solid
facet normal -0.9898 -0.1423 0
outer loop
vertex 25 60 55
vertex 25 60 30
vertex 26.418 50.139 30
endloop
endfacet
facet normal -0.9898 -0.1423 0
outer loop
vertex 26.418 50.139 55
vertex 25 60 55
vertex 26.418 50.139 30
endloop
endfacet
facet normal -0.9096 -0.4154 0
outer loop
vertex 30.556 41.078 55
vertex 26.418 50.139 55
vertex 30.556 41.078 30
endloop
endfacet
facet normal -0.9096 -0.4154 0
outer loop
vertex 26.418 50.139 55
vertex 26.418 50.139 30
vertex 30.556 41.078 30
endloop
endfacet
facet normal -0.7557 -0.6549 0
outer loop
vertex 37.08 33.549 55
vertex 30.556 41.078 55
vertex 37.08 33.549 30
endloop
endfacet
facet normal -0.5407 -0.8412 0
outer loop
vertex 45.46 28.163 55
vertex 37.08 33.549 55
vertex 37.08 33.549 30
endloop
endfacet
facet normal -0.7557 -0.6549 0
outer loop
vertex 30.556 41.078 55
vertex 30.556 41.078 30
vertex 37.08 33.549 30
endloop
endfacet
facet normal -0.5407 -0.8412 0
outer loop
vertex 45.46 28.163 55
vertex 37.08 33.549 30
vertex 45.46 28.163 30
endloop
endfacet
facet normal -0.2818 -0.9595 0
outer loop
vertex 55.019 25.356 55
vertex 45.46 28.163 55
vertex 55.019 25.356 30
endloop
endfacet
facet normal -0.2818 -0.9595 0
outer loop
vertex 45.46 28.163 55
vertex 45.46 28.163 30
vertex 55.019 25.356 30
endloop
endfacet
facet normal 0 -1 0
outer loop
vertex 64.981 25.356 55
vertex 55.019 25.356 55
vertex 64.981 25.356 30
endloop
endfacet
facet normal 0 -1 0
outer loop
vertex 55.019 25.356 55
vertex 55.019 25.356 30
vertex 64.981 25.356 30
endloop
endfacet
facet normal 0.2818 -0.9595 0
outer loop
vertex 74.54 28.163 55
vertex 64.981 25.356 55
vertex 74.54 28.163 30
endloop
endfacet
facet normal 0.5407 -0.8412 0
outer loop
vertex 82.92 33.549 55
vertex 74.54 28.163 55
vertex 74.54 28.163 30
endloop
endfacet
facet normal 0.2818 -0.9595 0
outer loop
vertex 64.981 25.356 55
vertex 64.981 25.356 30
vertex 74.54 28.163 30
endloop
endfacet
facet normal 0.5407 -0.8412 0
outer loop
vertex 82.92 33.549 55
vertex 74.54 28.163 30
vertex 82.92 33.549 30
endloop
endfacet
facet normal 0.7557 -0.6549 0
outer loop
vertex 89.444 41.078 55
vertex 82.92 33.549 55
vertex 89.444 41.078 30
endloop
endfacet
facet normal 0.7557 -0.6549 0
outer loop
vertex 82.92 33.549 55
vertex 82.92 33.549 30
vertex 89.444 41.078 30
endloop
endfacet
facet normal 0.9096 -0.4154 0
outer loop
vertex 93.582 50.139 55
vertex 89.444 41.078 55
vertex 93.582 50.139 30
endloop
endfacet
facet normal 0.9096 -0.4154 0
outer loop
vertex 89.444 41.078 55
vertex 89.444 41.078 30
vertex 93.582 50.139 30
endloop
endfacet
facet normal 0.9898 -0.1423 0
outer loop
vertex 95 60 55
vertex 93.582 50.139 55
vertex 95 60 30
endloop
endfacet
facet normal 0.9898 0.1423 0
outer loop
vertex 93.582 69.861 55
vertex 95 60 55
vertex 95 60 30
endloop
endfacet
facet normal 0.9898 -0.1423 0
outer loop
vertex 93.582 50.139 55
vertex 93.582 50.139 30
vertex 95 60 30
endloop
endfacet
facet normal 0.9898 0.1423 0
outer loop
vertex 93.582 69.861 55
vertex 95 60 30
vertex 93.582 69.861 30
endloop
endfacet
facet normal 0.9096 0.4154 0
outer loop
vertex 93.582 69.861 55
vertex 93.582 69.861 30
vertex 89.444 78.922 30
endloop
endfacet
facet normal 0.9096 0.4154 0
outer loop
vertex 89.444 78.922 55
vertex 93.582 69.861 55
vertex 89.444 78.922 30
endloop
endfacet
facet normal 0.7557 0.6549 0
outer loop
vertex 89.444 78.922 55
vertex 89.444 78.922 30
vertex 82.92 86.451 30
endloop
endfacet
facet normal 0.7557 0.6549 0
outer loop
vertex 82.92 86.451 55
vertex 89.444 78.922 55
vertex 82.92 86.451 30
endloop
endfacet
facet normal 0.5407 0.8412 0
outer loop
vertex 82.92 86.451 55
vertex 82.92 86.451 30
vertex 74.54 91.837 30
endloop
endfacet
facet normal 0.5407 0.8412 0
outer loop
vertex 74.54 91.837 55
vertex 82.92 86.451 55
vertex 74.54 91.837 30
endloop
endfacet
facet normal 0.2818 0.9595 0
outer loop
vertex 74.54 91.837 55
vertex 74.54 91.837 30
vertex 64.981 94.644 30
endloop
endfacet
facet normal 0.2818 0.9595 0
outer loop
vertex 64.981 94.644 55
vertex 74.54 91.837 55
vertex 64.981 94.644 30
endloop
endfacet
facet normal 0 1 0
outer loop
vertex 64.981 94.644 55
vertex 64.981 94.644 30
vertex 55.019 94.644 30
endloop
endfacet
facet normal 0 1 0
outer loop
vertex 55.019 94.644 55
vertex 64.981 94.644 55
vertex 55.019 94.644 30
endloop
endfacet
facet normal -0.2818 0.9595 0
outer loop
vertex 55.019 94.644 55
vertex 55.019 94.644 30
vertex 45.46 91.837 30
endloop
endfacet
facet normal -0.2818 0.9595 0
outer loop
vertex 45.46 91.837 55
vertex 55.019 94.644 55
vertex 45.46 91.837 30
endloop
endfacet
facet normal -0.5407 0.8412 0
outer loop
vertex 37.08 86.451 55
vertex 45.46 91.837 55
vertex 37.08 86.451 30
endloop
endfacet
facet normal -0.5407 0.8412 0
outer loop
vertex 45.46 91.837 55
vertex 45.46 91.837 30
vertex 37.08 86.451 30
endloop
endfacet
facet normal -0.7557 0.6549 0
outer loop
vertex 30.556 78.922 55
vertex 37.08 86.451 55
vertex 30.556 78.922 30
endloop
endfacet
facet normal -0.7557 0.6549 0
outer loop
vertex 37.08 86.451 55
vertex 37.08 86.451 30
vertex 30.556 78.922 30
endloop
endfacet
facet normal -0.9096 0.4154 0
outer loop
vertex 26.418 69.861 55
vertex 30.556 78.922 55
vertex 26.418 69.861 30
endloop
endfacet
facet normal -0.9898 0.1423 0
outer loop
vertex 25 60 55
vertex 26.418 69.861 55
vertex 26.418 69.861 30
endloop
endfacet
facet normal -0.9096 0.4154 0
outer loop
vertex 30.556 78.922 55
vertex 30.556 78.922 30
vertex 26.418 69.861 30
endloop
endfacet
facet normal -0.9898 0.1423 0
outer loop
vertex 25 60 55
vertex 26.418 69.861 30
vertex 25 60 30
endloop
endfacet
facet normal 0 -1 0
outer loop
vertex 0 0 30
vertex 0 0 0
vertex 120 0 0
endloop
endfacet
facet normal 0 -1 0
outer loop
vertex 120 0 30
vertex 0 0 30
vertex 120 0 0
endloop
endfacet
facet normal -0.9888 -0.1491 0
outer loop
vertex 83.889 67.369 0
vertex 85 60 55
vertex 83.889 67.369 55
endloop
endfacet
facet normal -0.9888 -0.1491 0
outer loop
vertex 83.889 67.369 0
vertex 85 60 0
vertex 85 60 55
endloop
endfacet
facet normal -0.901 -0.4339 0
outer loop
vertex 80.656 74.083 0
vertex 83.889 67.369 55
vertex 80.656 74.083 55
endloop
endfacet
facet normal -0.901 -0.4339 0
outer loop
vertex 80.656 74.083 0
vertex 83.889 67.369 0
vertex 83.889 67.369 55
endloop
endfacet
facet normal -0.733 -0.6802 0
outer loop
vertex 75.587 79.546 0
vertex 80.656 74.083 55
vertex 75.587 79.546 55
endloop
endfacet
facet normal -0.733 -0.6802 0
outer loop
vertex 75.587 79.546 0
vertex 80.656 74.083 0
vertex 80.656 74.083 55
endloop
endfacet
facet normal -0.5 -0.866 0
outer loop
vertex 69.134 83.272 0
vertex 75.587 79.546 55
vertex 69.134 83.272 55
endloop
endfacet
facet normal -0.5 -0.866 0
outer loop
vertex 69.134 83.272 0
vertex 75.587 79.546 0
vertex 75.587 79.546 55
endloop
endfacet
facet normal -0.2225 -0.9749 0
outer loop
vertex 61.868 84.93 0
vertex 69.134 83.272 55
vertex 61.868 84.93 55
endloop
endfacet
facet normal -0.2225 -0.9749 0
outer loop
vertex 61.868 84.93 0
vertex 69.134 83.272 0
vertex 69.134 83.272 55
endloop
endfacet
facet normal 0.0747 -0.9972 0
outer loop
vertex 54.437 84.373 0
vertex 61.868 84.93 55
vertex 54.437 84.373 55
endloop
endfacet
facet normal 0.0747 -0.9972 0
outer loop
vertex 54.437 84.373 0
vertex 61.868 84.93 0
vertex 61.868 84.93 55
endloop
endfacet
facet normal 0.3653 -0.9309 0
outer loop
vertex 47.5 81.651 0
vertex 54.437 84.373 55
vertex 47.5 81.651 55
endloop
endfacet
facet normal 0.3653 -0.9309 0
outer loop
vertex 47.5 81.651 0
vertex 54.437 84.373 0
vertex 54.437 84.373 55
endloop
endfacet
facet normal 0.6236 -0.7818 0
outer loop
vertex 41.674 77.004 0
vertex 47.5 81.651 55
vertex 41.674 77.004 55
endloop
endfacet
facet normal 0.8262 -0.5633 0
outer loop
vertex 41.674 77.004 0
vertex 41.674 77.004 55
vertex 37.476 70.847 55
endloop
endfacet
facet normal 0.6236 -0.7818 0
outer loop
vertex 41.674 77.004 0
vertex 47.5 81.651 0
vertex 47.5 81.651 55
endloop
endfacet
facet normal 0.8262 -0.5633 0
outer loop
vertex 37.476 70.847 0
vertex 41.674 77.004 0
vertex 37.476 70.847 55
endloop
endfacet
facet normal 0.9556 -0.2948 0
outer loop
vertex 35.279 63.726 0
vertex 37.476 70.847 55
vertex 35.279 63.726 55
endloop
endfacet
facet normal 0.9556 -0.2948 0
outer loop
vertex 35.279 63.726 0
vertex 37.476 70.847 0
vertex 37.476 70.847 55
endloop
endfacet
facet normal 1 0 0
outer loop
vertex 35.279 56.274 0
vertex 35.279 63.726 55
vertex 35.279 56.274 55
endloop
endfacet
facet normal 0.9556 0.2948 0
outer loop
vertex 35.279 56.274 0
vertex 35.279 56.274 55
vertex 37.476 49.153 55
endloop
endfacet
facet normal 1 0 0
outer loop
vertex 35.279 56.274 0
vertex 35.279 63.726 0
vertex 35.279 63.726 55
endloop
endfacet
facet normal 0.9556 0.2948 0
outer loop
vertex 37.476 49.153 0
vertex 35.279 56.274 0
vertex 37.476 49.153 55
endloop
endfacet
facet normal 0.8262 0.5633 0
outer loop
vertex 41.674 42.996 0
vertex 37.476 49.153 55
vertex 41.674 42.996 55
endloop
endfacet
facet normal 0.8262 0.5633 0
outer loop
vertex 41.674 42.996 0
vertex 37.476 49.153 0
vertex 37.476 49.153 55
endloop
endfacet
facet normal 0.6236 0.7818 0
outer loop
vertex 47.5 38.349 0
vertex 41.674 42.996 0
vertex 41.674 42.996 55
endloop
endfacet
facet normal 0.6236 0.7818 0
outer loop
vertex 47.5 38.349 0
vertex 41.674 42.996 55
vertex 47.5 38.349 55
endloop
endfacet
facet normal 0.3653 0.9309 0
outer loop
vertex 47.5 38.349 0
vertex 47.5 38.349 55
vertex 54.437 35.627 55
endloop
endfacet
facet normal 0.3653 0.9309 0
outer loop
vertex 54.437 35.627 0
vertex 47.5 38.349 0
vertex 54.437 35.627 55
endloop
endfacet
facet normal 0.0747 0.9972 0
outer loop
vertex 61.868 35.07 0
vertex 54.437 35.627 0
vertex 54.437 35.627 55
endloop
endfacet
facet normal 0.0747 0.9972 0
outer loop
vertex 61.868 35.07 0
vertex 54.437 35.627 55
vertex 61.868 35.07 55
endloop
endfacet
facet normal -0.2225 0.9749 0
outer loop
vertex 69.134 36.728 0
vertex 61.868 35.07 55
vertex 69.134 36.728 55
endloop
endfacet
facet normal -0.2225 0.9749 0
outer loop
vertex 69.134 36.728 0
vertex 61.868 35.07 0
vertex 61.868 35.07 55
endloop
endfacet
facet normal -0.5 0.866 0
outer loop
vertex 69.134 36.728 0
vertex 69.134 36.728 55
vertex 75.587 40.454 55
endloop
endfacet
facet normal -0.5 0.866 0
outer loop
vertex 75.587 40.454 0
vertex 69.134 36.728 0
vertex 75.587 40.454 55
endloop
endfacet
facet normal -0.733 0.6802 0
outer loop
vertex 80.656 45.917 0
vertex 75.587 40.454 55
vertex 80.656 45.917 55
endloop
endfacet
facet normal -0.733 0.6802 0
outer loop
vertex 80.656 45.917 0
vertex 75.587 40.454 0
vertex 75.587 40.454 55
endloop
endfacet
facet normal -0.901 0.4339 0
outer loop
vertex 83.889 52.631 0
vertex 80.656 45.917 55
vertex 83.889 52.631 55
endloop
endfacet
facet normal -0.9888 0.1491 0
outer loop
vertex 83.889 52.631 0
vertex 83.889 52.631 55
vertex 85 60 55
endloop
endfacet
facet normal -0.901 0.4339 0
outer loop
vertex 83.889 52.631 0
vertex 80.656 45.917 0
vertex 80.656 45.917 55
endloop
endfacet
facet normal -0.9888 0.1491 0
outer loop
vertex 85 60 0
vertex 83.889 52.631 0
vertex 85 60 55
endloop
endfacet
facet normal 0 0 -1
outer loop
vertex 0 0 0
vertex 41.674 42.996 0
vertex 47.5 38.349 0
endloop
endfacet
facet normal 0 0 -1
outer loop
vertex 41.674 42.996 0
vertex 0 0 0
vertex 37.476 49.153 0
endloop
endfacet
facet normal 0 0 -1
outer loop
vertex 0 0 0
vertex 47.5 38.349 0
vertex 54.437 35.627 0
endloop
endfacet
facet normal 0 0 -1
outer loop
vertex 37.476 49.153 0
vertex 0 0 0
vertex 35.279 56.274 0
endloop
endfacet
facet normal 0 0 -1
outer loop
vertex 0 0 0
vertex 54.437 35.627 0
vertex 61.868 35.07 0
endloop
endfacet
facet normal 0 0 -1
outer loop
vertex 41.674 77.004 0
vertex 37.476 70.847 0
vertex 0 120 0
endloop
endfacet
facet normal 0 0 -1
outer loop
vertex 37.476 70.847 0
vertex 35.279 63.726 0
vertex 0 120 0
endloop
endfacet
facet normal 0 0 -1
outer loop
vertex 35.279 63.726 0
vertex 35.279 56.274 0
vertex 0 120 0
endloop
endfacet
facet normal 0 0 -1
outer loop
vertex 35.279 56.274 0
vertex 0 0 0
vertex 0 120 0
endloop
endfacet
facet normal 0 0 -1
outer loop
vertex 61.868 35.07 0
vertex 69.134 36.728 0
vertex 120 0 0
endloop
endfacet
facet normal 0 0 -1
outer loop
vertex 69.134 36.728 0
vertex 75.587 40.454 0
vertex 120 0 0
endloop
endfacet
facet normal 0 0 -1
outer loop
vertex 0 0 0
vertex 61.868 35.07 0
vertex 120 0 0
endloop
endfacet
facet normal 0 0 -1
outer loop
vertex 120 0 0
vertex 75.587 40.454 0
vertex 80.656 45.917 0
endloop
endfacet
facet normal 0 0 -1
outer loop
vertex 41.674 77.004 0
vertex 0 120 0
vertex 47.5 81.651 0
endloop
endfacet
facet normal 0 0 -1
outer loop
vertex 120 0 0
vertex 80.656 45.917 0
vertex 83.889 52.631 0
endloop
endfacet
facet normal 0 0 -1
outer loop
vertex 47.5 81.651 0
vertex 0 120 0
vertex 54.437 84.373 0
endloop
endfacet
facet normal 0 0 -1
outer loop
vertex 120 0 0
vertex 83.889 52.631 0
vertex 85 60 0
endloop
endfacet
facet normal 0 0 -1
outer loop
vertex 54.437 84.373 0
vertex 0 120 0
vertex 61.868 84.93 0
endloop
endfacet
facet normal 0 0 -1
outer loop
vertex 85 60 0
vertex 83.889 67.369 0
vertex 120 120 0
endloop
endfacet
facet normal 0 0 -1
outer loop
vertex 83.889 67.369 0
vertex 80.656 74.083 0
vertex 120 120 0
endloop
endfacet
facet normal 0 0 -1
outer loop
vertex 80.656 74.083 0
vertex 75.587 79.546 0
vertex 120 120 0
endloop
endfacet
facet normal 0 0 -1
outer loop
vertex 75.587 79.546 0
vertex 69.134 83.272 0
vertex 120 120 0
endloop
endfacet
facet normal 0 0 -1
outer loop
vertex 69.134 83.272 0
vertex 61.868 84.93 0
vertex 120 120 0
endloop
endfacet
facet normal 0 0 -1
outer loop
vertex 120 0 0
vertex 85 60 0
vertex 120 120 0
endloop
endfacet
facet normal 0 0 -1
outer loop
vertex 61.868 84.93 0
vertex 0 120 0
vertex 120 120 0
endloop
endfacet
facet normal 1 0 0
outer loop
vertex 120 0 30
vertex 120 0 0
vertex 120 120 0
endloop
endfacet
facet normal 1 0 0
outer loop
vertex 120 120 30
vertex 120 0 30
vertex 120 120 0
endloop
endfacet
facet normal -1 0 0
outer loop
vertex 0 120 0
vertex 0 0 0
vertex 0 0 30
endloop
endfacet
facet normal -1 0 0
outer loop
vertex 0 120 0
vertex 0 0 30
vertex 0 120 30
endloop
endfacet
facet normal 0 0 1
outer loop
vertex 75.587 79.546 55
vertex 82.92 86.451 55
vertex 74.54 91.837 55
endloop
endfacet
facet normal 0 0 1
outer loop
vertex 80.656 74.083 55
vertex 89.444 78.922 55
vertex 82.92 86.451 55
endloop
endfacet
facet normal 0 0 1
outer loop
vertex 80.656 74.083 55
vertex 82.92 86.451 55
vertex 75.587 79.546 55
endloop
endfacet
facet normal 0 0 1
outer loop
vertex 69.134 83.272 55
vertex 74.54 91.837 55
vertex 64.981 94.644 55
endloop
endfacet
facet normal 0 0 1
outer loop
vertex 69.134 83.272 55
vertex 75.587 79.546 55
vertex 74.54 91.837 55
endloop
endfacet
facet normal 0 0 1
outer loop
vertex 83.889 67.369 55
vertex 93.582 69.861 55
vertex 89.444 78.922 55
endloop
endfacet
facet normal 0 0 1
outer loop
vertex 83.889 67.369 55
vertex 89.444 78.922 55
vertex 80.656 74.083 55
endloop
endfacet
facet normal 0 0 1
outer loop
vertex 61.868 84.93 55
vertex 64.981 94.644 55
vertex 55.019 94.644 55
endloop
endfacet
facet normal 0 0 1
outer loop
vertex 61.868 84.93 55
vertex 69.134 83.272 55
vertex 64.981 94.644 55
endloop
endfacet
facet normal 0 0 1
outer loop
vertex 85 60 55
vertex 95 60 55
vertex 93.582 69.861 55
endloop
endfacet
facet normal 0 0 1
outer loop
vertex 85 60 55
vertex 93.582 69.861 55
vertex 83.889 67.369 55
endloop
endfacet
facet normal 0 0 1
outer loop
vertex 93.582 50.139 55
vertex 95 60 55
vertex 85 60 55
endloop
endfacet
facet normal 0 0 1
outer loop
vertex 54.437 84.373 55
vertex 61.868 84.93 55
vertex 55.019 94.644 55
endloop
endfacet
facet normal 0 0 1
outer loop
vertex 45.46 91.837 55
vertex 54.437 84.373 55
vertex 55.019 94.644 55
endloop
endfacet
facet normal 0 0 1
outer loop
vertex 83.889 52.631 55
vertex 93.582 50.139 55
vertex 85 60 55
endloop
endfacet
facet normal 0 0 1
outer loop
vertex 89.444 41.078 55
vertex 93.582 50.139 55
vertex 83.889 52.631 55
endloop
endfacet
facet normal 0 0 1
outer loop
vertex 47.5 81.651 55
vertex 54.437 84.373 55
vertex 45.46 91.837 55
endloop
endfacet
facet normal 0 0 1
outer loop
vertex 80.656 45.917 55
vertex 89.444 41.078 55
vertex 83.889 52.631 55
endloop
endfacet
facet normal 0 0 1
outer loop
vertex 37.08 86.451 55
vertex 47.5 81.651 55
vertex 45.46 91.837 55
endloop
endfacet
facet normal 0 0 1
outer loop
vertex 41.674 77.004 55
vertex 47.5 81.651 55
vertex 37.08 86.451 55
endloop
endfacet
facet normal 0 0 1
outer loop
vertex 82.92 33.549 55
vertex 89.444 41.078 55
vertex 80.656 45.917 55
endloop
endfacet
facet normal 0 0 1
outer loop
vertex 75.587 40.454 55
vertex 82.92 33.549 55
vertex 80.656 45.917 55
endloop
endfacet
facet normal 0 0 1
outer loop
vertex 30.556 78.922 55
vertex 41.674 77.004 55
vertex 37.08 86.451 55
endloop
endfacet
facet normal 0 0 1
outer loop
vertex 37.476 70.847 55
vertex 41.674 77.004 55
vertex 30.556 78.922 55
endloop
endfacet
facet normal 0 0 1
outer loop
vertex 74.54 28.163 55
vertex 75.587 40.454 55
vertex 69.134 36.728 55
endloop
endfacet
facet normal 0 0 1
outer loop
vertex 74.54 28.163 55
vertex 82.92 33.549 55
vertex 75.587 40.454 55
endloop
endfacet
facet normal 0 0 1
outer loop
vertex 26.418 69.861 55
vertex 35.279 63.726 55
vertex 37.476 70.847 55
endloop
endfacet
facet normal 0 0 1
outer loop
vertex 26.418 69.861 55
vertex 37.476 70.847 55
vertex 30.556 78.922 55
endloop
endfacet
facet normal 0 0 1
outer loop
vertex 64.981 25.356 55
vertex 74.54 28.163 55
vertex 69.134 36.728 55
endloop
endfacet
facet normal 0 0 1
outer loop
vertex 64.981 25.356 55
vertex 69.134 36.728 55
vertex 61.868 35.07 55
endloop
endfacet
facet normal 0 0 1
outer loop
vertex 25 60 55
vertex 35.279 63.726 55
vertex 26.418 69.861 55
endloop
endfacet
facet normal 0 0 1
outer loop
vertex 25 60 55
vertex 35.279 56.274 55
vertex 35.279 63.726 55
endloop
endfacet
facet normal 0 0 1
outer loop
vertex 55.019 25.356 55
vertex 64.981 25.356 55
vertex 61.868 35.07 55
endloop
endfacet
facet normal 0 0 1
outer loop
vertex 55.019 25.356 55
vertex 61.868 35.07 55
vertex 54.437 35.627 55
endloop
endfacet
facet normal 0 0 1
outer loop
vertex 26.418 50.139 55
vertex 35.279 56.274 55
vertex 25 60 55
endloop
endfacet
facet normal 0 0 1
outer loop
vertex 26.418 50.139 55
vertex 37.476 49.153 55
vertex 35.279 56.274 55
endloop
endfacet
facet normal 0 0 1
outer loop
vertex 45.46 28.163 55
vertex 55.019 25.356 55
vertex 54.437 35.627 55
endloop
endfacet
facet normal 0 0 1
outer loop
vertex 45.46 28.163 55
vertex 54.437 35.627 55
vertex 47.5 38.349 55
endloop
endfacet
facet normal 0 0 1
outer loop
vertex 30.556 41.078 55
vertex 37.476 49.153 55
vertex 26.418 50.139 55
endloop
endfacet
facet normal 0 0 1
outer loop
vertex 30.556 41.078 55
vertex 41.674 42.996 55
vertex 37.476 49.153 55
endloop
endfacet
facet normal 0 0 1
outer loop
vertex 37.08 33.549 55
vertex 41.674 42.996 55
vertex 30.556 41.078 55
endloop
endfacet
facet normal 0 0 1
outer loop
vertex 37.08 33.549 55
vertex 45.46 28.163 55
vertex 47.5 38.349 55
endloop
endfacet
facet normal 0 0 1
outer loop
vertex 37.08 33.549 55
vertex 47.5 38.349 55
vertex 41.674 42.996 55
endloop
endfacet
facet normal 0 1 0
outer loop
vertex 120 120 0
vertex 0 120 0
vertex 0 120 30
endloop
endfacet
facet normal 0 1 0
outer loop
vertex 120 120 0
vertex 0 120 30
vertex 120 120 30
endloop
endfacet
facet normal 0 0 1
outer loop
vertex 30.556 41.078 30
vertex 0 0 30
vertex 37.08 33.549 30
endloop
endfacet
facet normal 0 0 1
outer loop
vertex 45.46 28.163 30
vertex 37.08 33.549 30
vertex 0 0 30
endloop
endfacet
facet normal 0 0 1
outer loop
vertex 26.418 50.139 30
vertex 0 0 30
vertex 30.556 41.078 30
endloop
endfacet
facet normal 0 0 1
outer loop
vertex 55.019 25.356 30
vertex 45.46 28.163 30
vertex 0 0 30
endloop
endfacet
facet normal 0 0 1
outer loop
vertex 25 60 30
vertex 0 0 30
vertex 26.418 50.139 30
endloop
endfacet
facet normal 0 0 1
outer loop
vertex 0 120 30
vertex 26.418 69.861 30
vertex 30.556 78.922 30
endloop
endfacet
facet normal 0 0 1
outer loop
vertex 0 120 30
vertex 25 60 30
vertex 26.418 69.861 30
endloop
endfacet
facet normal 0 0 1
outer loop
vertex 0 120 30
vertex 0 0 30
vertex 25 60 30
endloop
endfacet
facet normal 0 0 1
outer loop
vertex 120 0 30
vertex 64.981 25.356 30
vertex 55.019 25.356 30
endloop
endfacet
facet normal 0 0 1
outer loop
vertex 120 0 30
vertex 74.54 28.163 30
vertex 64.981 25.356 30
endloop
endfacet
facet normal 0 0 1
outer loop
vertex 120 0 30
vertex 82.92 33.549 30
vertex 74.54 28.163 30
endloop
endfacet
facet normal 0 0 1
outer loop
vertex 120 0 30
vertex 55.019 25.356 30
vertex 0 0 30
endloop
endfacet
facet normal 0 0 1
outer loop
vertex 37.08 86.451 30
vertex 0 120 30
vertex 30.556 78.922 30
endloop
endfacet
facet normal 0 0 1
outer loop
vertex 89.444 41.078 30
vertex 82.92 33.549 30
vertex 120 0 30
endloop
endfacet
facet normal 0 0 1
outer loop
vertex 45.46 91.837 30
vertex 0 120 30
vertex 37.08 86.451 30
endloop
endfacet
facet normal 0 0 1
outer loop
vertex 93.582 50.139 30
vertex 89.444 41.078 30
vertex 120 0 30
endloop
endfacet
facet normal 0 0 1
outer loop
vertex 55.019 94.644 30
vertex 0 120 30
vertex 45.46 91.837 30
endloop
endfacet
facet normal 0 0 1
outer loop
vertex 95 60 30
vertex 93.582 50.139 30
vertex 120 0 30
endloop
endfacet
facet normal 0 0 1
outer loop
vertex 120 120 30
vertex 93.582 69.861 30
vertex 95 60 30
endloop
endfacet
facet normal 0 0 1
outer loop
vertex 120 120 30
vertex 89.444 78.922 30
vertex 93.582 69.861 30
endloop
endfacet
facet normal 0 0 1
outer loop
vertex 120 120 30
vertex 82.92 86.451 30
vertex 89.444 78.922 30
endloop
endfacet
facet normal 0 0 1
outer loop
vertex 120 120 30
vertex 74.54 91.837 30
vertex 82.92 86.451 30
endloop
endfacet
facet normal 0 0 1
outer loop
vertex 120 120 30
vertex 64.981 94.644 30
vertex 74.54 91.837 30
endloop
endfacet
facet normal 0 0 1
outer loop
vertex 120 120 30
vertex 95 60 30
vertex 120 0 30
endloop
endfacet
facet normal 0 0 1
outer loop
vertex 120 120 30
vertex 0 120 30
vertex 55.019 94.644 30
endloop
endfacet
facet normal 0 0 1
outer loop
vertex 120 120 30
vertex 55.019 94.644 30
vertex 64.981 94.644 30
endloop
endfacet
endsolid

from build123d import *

# Parameters (mm, degrees)
SKETCH_1_W      = 120
SKETCH_1_H      = 120
SKETCH_1_R      = 25
EXTRUDE_1_DEPTH = 30
SKETCH_2_R      = 35
SKETCH_2_R_2    = 25
EXTRUDE_2_DEPTH = 25


with BuildPart() as part:
    # 草圖1 → 填料-伸長1 (new body)
    with BuildSketch(Plane.XY):
        with Locations((60, 60)):
            Rectangle(SKETCH_1_W, SKETCH_1_H)
        with Locations((60, 60)):
            Circle(SKETCH_1_R, mode=Mode.SUBTRACT)
    extrude(amount=EXTRUDE_1_DEPTH)

    # 草圖2 → 填料-伸長2 (add)
    with BuildSketch(Plane.XY.offset(30)):
        with Locations(Location((60, 60, 0), (0, 0, 180))):
            Circle(SKETCH_2_R)
        with Locations((60, 60)):
            Circle(SKETCH_2_R_2, mode=Mode.SUBTRACT)
    extrude(amount=EXTRUDE_2_DEPTH)


solid = part.part
